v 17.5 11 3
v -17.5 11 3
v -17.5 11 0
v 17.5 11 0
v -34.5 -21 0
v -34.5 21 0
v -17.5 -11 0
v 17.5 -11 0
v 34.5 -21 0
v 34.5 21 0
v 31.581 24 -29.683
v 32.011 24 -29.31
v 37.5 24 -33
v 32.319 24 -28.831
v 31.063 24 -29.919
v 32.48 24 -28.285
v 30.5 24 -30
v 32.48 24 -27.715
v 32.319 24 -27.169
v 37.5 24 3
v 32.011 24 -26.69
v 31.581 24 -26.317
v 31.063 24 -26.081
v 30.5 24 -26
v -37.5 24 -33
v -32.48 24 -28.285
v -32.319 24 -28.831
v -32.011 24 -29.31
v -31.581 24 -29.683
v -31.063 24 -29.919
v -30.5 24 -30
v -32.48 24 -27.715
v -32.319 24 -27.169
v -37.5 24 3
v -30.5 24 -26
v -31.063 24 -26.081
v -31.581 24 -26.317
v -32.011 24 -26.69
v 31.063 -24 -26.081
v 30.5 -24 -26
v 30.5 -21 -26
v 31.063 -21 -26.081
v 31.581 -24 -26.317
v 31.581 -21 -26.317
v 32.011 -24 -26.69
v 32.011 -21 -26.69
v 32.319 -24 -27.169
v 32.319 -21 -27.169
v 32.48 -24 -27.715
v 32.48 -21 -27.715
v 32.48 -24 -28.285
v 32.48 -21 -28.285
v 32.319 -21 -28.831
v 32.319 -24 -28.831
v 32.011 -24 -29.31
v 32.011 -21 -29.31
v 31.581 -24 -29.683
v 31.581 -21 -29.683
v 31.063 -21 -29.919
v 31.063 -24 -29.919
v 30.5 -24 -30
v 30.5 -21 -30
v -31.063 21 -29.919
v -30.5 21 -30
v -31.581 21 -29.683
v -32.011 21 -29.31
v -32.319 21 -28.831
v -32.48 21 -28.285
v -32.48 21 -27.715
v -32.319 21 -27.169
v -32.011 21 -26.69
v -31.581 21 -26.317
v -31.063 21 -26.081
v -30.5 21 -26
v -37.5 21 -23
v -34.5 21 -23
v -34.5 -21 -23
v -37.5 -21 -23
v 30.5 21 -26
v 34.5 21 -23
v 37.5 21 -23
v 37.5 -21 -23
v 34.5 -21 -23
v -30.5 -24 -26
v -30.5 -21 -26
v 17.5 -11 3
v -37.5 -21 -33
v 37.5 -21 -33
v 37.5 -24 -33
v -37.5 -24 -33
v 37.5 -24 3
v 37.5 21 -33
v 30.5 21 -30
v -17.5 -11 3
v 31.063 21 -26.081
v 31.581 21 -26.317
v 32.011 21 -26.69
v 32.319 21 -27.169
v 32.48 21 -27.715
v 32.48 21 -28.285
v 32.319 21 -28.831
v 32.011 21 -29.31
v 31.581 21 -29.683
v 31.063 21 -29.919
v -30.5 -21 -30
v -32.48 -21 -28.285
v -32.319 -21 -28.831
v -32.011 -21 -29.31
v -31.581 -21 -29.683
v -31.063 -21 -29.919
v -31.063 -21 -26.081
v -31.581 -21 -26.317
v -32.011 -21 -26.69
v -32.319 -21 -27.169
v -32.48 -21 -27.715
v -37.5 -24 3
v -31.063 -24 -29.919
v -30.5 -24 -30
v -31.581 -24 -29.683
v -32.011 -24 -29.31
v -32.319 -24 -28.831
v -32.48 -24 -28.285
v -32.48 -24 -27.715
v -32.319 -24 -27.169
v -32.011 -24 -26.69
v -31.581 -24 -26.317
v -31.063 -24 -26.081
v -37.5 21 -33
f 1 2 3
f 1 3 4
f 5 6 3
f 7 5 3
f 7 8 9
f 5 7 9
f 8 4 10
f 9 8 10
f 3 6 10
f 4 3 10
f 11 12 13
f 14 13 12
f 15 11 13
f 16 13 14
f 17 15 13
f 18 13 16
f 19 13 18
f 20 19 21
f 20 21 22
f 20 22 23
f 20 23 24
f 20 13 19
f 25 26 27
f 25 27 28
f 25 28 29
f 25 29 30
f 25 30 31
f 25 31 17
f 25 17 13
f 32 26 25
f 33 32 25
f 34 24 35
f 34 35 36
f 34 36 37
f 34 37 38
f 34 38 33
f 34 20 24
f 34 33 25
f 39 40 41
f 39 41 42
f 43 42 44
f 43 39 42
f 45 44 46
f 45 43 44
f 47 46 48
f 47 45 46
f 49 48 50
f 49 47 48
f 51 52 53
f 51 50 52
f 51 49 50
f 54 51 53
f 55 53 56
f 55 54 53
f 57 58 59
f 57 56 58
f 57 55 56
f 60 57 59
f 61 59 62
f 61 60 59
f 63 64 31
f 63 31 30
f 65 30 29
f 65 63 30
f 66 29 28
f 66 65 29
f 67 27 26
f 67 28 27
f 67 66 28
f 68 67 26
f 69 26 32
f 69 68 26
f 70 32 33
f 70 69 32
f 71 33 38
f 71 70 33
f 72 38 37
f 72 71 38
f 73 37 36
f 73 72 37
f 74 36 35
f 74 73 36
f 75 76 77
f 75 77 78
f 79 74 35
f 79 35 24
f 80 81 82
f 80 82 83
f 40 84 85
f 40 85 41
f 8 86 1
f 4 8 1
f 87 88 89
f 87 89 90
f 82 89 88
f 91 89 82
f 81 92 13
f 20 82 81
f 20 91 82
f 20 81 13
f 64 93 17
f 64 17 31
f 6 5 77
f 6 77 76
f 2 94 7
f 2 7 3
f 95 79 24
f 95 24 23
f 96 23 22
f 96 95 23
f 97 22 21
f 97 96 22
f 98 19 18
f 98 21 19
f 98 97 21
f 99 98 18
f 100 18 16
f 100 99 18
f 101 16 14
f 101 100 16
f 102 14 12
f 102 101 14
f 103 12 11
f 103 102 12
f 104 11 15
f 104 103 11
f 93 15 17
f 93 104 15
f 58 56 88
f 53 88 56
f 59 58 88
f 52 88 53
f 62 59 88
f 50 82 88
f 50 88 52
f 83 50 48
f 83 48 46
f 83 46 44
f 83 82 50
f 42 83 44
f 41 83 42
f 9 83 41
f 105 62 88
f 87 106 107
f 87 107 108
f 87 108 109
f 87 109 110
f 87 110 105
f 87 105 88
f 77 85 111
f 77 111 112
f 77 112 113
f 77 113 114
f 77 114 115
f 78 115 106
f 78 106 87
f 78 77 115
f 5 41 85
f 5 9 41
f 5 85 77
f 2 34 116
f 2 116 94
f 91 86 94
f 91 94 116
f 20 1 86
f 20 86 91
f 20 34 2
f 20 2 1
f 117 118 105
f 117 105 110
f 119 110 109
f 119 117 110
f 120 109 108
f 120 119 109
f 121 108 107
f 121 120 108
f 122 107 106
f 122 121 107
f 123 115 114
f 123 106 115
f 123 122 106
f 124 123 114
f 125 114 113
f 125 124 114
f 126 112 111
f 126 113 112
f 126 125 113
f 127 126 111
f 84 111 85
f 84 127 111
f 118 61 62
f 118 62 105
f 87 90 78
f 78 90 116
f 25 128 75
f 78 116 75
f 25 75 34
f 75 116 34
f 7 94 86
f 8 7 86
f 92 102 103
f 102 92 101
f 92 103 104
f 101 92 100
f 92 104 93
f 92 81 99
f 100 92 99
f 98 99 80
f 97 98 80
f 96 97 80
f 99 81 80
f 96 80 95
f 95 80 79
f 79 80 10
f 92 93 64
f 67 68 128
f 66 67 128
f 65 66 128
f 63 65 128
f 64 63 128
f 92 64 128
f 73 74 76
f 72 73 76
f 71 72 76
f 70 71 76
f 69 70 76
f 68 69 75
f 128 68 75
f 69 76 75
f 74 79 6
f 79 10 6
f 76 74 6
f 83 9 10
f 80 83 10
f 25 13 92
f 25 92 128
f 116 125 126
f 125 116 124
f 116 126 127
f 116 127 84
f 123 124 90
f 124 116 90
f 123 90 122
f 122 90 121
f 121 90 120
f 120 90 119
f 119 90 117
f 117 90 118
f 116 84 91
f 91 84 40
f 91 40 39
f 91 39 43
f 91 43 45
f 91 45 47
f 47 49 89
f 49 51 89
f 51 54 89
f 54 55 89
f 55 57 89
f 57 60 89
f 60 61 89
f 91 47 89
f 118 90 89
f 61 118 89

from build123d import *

# Parameters (mm, degrees)
SKETCH1_W           = 75
SKETCH1_H           = 48
BOSS_EXTRUDE1_DEPTH = 3
SKETCH2_W           = 35
SKETCH2_H           = 22
CUT_EXTRUDE1_DEPTH  = 3
SKETCH3_W           = 75
SKETCH3_H           = 3
BOSS_EXTRUDE2_DEPTH = 33
SKETCH4_W           = 3
SKETCH4_H           = 42
BOSS_EXTRUDE3_DEPTH = 23
CUT_EXTRUDE2_DEPTH  = 70.276619433


with BuildPart() as part:
    # Sketch1 → Boss-Extrude1 (new body)
    with BuildSketch(Plane.XY):
        Rectangle(SKETCH1_W, SKETCH1_H)
    extrude(amount=BOSS_EXTRUDE1_DEPTH)

    # Sketch2 → Cut-Extrude1 (cut)
    with BuildSketch(Plane.XY.offset(3)):
        Rectangle(SKETCH2_W, SKETCH2_H)
    extrude(amount=-CUT_EXTRUDE1_DEPTH, mode=Mode.SUBTRACT)

    # Sketch3 → Boss-Extrude2 (add)
    with BuildSketch(Plane(origin=(0, 0, 0), x_dir=(-1, 0, 0), z_dir=(0, 0, -1))):
        with Locations((0, 22.5)):
            Rectangle(SKETCH3_W, SKETCH3_H)
        with Locations((0, -22.5)):
            Rectangle(SKETCH3_W, SKETCH3_H)
    extrude(amount=BOSS_EXTRUDE2_DEPTH)

    # Sketch4 → Boss-Extrude3 (add)
    with BuildSketch(Plane(origin=(0, 0, 0), x_dir=(-1, 0, 0), z_dir=(0, 0, -1))):
        with Locations((-36, 0)):
            Rectangle(SKETCH4_W, SKETCH4_H)
        with Locations((36, 0)):
            Rectangle(SKETCH4_W, SKETCH4_H)
    extrude(amount=BOSS_EXTRUDE3_DEPTH)

    # Sketch5 → Cut-Extrude2 (cut, through all)
    with BuildSketch(Plane.XZ.offset(24)):
        with BuildLine():
            Line((-30.5, -26), (30.5, -26))
            ThreePointArc((30.5, -26), (32.5, -28), (30.5, -30))
            Line((30.5, -30), (-30.5, -30))
            ThreePointArc((-30.5, -30), (-32.5, -28), (-30.5, -26))
        make_face()
    extrude(amount=-CUT_EXTRUDE2_DEPTH, mode=Mode.SUBTRACT)


solid = part.part
